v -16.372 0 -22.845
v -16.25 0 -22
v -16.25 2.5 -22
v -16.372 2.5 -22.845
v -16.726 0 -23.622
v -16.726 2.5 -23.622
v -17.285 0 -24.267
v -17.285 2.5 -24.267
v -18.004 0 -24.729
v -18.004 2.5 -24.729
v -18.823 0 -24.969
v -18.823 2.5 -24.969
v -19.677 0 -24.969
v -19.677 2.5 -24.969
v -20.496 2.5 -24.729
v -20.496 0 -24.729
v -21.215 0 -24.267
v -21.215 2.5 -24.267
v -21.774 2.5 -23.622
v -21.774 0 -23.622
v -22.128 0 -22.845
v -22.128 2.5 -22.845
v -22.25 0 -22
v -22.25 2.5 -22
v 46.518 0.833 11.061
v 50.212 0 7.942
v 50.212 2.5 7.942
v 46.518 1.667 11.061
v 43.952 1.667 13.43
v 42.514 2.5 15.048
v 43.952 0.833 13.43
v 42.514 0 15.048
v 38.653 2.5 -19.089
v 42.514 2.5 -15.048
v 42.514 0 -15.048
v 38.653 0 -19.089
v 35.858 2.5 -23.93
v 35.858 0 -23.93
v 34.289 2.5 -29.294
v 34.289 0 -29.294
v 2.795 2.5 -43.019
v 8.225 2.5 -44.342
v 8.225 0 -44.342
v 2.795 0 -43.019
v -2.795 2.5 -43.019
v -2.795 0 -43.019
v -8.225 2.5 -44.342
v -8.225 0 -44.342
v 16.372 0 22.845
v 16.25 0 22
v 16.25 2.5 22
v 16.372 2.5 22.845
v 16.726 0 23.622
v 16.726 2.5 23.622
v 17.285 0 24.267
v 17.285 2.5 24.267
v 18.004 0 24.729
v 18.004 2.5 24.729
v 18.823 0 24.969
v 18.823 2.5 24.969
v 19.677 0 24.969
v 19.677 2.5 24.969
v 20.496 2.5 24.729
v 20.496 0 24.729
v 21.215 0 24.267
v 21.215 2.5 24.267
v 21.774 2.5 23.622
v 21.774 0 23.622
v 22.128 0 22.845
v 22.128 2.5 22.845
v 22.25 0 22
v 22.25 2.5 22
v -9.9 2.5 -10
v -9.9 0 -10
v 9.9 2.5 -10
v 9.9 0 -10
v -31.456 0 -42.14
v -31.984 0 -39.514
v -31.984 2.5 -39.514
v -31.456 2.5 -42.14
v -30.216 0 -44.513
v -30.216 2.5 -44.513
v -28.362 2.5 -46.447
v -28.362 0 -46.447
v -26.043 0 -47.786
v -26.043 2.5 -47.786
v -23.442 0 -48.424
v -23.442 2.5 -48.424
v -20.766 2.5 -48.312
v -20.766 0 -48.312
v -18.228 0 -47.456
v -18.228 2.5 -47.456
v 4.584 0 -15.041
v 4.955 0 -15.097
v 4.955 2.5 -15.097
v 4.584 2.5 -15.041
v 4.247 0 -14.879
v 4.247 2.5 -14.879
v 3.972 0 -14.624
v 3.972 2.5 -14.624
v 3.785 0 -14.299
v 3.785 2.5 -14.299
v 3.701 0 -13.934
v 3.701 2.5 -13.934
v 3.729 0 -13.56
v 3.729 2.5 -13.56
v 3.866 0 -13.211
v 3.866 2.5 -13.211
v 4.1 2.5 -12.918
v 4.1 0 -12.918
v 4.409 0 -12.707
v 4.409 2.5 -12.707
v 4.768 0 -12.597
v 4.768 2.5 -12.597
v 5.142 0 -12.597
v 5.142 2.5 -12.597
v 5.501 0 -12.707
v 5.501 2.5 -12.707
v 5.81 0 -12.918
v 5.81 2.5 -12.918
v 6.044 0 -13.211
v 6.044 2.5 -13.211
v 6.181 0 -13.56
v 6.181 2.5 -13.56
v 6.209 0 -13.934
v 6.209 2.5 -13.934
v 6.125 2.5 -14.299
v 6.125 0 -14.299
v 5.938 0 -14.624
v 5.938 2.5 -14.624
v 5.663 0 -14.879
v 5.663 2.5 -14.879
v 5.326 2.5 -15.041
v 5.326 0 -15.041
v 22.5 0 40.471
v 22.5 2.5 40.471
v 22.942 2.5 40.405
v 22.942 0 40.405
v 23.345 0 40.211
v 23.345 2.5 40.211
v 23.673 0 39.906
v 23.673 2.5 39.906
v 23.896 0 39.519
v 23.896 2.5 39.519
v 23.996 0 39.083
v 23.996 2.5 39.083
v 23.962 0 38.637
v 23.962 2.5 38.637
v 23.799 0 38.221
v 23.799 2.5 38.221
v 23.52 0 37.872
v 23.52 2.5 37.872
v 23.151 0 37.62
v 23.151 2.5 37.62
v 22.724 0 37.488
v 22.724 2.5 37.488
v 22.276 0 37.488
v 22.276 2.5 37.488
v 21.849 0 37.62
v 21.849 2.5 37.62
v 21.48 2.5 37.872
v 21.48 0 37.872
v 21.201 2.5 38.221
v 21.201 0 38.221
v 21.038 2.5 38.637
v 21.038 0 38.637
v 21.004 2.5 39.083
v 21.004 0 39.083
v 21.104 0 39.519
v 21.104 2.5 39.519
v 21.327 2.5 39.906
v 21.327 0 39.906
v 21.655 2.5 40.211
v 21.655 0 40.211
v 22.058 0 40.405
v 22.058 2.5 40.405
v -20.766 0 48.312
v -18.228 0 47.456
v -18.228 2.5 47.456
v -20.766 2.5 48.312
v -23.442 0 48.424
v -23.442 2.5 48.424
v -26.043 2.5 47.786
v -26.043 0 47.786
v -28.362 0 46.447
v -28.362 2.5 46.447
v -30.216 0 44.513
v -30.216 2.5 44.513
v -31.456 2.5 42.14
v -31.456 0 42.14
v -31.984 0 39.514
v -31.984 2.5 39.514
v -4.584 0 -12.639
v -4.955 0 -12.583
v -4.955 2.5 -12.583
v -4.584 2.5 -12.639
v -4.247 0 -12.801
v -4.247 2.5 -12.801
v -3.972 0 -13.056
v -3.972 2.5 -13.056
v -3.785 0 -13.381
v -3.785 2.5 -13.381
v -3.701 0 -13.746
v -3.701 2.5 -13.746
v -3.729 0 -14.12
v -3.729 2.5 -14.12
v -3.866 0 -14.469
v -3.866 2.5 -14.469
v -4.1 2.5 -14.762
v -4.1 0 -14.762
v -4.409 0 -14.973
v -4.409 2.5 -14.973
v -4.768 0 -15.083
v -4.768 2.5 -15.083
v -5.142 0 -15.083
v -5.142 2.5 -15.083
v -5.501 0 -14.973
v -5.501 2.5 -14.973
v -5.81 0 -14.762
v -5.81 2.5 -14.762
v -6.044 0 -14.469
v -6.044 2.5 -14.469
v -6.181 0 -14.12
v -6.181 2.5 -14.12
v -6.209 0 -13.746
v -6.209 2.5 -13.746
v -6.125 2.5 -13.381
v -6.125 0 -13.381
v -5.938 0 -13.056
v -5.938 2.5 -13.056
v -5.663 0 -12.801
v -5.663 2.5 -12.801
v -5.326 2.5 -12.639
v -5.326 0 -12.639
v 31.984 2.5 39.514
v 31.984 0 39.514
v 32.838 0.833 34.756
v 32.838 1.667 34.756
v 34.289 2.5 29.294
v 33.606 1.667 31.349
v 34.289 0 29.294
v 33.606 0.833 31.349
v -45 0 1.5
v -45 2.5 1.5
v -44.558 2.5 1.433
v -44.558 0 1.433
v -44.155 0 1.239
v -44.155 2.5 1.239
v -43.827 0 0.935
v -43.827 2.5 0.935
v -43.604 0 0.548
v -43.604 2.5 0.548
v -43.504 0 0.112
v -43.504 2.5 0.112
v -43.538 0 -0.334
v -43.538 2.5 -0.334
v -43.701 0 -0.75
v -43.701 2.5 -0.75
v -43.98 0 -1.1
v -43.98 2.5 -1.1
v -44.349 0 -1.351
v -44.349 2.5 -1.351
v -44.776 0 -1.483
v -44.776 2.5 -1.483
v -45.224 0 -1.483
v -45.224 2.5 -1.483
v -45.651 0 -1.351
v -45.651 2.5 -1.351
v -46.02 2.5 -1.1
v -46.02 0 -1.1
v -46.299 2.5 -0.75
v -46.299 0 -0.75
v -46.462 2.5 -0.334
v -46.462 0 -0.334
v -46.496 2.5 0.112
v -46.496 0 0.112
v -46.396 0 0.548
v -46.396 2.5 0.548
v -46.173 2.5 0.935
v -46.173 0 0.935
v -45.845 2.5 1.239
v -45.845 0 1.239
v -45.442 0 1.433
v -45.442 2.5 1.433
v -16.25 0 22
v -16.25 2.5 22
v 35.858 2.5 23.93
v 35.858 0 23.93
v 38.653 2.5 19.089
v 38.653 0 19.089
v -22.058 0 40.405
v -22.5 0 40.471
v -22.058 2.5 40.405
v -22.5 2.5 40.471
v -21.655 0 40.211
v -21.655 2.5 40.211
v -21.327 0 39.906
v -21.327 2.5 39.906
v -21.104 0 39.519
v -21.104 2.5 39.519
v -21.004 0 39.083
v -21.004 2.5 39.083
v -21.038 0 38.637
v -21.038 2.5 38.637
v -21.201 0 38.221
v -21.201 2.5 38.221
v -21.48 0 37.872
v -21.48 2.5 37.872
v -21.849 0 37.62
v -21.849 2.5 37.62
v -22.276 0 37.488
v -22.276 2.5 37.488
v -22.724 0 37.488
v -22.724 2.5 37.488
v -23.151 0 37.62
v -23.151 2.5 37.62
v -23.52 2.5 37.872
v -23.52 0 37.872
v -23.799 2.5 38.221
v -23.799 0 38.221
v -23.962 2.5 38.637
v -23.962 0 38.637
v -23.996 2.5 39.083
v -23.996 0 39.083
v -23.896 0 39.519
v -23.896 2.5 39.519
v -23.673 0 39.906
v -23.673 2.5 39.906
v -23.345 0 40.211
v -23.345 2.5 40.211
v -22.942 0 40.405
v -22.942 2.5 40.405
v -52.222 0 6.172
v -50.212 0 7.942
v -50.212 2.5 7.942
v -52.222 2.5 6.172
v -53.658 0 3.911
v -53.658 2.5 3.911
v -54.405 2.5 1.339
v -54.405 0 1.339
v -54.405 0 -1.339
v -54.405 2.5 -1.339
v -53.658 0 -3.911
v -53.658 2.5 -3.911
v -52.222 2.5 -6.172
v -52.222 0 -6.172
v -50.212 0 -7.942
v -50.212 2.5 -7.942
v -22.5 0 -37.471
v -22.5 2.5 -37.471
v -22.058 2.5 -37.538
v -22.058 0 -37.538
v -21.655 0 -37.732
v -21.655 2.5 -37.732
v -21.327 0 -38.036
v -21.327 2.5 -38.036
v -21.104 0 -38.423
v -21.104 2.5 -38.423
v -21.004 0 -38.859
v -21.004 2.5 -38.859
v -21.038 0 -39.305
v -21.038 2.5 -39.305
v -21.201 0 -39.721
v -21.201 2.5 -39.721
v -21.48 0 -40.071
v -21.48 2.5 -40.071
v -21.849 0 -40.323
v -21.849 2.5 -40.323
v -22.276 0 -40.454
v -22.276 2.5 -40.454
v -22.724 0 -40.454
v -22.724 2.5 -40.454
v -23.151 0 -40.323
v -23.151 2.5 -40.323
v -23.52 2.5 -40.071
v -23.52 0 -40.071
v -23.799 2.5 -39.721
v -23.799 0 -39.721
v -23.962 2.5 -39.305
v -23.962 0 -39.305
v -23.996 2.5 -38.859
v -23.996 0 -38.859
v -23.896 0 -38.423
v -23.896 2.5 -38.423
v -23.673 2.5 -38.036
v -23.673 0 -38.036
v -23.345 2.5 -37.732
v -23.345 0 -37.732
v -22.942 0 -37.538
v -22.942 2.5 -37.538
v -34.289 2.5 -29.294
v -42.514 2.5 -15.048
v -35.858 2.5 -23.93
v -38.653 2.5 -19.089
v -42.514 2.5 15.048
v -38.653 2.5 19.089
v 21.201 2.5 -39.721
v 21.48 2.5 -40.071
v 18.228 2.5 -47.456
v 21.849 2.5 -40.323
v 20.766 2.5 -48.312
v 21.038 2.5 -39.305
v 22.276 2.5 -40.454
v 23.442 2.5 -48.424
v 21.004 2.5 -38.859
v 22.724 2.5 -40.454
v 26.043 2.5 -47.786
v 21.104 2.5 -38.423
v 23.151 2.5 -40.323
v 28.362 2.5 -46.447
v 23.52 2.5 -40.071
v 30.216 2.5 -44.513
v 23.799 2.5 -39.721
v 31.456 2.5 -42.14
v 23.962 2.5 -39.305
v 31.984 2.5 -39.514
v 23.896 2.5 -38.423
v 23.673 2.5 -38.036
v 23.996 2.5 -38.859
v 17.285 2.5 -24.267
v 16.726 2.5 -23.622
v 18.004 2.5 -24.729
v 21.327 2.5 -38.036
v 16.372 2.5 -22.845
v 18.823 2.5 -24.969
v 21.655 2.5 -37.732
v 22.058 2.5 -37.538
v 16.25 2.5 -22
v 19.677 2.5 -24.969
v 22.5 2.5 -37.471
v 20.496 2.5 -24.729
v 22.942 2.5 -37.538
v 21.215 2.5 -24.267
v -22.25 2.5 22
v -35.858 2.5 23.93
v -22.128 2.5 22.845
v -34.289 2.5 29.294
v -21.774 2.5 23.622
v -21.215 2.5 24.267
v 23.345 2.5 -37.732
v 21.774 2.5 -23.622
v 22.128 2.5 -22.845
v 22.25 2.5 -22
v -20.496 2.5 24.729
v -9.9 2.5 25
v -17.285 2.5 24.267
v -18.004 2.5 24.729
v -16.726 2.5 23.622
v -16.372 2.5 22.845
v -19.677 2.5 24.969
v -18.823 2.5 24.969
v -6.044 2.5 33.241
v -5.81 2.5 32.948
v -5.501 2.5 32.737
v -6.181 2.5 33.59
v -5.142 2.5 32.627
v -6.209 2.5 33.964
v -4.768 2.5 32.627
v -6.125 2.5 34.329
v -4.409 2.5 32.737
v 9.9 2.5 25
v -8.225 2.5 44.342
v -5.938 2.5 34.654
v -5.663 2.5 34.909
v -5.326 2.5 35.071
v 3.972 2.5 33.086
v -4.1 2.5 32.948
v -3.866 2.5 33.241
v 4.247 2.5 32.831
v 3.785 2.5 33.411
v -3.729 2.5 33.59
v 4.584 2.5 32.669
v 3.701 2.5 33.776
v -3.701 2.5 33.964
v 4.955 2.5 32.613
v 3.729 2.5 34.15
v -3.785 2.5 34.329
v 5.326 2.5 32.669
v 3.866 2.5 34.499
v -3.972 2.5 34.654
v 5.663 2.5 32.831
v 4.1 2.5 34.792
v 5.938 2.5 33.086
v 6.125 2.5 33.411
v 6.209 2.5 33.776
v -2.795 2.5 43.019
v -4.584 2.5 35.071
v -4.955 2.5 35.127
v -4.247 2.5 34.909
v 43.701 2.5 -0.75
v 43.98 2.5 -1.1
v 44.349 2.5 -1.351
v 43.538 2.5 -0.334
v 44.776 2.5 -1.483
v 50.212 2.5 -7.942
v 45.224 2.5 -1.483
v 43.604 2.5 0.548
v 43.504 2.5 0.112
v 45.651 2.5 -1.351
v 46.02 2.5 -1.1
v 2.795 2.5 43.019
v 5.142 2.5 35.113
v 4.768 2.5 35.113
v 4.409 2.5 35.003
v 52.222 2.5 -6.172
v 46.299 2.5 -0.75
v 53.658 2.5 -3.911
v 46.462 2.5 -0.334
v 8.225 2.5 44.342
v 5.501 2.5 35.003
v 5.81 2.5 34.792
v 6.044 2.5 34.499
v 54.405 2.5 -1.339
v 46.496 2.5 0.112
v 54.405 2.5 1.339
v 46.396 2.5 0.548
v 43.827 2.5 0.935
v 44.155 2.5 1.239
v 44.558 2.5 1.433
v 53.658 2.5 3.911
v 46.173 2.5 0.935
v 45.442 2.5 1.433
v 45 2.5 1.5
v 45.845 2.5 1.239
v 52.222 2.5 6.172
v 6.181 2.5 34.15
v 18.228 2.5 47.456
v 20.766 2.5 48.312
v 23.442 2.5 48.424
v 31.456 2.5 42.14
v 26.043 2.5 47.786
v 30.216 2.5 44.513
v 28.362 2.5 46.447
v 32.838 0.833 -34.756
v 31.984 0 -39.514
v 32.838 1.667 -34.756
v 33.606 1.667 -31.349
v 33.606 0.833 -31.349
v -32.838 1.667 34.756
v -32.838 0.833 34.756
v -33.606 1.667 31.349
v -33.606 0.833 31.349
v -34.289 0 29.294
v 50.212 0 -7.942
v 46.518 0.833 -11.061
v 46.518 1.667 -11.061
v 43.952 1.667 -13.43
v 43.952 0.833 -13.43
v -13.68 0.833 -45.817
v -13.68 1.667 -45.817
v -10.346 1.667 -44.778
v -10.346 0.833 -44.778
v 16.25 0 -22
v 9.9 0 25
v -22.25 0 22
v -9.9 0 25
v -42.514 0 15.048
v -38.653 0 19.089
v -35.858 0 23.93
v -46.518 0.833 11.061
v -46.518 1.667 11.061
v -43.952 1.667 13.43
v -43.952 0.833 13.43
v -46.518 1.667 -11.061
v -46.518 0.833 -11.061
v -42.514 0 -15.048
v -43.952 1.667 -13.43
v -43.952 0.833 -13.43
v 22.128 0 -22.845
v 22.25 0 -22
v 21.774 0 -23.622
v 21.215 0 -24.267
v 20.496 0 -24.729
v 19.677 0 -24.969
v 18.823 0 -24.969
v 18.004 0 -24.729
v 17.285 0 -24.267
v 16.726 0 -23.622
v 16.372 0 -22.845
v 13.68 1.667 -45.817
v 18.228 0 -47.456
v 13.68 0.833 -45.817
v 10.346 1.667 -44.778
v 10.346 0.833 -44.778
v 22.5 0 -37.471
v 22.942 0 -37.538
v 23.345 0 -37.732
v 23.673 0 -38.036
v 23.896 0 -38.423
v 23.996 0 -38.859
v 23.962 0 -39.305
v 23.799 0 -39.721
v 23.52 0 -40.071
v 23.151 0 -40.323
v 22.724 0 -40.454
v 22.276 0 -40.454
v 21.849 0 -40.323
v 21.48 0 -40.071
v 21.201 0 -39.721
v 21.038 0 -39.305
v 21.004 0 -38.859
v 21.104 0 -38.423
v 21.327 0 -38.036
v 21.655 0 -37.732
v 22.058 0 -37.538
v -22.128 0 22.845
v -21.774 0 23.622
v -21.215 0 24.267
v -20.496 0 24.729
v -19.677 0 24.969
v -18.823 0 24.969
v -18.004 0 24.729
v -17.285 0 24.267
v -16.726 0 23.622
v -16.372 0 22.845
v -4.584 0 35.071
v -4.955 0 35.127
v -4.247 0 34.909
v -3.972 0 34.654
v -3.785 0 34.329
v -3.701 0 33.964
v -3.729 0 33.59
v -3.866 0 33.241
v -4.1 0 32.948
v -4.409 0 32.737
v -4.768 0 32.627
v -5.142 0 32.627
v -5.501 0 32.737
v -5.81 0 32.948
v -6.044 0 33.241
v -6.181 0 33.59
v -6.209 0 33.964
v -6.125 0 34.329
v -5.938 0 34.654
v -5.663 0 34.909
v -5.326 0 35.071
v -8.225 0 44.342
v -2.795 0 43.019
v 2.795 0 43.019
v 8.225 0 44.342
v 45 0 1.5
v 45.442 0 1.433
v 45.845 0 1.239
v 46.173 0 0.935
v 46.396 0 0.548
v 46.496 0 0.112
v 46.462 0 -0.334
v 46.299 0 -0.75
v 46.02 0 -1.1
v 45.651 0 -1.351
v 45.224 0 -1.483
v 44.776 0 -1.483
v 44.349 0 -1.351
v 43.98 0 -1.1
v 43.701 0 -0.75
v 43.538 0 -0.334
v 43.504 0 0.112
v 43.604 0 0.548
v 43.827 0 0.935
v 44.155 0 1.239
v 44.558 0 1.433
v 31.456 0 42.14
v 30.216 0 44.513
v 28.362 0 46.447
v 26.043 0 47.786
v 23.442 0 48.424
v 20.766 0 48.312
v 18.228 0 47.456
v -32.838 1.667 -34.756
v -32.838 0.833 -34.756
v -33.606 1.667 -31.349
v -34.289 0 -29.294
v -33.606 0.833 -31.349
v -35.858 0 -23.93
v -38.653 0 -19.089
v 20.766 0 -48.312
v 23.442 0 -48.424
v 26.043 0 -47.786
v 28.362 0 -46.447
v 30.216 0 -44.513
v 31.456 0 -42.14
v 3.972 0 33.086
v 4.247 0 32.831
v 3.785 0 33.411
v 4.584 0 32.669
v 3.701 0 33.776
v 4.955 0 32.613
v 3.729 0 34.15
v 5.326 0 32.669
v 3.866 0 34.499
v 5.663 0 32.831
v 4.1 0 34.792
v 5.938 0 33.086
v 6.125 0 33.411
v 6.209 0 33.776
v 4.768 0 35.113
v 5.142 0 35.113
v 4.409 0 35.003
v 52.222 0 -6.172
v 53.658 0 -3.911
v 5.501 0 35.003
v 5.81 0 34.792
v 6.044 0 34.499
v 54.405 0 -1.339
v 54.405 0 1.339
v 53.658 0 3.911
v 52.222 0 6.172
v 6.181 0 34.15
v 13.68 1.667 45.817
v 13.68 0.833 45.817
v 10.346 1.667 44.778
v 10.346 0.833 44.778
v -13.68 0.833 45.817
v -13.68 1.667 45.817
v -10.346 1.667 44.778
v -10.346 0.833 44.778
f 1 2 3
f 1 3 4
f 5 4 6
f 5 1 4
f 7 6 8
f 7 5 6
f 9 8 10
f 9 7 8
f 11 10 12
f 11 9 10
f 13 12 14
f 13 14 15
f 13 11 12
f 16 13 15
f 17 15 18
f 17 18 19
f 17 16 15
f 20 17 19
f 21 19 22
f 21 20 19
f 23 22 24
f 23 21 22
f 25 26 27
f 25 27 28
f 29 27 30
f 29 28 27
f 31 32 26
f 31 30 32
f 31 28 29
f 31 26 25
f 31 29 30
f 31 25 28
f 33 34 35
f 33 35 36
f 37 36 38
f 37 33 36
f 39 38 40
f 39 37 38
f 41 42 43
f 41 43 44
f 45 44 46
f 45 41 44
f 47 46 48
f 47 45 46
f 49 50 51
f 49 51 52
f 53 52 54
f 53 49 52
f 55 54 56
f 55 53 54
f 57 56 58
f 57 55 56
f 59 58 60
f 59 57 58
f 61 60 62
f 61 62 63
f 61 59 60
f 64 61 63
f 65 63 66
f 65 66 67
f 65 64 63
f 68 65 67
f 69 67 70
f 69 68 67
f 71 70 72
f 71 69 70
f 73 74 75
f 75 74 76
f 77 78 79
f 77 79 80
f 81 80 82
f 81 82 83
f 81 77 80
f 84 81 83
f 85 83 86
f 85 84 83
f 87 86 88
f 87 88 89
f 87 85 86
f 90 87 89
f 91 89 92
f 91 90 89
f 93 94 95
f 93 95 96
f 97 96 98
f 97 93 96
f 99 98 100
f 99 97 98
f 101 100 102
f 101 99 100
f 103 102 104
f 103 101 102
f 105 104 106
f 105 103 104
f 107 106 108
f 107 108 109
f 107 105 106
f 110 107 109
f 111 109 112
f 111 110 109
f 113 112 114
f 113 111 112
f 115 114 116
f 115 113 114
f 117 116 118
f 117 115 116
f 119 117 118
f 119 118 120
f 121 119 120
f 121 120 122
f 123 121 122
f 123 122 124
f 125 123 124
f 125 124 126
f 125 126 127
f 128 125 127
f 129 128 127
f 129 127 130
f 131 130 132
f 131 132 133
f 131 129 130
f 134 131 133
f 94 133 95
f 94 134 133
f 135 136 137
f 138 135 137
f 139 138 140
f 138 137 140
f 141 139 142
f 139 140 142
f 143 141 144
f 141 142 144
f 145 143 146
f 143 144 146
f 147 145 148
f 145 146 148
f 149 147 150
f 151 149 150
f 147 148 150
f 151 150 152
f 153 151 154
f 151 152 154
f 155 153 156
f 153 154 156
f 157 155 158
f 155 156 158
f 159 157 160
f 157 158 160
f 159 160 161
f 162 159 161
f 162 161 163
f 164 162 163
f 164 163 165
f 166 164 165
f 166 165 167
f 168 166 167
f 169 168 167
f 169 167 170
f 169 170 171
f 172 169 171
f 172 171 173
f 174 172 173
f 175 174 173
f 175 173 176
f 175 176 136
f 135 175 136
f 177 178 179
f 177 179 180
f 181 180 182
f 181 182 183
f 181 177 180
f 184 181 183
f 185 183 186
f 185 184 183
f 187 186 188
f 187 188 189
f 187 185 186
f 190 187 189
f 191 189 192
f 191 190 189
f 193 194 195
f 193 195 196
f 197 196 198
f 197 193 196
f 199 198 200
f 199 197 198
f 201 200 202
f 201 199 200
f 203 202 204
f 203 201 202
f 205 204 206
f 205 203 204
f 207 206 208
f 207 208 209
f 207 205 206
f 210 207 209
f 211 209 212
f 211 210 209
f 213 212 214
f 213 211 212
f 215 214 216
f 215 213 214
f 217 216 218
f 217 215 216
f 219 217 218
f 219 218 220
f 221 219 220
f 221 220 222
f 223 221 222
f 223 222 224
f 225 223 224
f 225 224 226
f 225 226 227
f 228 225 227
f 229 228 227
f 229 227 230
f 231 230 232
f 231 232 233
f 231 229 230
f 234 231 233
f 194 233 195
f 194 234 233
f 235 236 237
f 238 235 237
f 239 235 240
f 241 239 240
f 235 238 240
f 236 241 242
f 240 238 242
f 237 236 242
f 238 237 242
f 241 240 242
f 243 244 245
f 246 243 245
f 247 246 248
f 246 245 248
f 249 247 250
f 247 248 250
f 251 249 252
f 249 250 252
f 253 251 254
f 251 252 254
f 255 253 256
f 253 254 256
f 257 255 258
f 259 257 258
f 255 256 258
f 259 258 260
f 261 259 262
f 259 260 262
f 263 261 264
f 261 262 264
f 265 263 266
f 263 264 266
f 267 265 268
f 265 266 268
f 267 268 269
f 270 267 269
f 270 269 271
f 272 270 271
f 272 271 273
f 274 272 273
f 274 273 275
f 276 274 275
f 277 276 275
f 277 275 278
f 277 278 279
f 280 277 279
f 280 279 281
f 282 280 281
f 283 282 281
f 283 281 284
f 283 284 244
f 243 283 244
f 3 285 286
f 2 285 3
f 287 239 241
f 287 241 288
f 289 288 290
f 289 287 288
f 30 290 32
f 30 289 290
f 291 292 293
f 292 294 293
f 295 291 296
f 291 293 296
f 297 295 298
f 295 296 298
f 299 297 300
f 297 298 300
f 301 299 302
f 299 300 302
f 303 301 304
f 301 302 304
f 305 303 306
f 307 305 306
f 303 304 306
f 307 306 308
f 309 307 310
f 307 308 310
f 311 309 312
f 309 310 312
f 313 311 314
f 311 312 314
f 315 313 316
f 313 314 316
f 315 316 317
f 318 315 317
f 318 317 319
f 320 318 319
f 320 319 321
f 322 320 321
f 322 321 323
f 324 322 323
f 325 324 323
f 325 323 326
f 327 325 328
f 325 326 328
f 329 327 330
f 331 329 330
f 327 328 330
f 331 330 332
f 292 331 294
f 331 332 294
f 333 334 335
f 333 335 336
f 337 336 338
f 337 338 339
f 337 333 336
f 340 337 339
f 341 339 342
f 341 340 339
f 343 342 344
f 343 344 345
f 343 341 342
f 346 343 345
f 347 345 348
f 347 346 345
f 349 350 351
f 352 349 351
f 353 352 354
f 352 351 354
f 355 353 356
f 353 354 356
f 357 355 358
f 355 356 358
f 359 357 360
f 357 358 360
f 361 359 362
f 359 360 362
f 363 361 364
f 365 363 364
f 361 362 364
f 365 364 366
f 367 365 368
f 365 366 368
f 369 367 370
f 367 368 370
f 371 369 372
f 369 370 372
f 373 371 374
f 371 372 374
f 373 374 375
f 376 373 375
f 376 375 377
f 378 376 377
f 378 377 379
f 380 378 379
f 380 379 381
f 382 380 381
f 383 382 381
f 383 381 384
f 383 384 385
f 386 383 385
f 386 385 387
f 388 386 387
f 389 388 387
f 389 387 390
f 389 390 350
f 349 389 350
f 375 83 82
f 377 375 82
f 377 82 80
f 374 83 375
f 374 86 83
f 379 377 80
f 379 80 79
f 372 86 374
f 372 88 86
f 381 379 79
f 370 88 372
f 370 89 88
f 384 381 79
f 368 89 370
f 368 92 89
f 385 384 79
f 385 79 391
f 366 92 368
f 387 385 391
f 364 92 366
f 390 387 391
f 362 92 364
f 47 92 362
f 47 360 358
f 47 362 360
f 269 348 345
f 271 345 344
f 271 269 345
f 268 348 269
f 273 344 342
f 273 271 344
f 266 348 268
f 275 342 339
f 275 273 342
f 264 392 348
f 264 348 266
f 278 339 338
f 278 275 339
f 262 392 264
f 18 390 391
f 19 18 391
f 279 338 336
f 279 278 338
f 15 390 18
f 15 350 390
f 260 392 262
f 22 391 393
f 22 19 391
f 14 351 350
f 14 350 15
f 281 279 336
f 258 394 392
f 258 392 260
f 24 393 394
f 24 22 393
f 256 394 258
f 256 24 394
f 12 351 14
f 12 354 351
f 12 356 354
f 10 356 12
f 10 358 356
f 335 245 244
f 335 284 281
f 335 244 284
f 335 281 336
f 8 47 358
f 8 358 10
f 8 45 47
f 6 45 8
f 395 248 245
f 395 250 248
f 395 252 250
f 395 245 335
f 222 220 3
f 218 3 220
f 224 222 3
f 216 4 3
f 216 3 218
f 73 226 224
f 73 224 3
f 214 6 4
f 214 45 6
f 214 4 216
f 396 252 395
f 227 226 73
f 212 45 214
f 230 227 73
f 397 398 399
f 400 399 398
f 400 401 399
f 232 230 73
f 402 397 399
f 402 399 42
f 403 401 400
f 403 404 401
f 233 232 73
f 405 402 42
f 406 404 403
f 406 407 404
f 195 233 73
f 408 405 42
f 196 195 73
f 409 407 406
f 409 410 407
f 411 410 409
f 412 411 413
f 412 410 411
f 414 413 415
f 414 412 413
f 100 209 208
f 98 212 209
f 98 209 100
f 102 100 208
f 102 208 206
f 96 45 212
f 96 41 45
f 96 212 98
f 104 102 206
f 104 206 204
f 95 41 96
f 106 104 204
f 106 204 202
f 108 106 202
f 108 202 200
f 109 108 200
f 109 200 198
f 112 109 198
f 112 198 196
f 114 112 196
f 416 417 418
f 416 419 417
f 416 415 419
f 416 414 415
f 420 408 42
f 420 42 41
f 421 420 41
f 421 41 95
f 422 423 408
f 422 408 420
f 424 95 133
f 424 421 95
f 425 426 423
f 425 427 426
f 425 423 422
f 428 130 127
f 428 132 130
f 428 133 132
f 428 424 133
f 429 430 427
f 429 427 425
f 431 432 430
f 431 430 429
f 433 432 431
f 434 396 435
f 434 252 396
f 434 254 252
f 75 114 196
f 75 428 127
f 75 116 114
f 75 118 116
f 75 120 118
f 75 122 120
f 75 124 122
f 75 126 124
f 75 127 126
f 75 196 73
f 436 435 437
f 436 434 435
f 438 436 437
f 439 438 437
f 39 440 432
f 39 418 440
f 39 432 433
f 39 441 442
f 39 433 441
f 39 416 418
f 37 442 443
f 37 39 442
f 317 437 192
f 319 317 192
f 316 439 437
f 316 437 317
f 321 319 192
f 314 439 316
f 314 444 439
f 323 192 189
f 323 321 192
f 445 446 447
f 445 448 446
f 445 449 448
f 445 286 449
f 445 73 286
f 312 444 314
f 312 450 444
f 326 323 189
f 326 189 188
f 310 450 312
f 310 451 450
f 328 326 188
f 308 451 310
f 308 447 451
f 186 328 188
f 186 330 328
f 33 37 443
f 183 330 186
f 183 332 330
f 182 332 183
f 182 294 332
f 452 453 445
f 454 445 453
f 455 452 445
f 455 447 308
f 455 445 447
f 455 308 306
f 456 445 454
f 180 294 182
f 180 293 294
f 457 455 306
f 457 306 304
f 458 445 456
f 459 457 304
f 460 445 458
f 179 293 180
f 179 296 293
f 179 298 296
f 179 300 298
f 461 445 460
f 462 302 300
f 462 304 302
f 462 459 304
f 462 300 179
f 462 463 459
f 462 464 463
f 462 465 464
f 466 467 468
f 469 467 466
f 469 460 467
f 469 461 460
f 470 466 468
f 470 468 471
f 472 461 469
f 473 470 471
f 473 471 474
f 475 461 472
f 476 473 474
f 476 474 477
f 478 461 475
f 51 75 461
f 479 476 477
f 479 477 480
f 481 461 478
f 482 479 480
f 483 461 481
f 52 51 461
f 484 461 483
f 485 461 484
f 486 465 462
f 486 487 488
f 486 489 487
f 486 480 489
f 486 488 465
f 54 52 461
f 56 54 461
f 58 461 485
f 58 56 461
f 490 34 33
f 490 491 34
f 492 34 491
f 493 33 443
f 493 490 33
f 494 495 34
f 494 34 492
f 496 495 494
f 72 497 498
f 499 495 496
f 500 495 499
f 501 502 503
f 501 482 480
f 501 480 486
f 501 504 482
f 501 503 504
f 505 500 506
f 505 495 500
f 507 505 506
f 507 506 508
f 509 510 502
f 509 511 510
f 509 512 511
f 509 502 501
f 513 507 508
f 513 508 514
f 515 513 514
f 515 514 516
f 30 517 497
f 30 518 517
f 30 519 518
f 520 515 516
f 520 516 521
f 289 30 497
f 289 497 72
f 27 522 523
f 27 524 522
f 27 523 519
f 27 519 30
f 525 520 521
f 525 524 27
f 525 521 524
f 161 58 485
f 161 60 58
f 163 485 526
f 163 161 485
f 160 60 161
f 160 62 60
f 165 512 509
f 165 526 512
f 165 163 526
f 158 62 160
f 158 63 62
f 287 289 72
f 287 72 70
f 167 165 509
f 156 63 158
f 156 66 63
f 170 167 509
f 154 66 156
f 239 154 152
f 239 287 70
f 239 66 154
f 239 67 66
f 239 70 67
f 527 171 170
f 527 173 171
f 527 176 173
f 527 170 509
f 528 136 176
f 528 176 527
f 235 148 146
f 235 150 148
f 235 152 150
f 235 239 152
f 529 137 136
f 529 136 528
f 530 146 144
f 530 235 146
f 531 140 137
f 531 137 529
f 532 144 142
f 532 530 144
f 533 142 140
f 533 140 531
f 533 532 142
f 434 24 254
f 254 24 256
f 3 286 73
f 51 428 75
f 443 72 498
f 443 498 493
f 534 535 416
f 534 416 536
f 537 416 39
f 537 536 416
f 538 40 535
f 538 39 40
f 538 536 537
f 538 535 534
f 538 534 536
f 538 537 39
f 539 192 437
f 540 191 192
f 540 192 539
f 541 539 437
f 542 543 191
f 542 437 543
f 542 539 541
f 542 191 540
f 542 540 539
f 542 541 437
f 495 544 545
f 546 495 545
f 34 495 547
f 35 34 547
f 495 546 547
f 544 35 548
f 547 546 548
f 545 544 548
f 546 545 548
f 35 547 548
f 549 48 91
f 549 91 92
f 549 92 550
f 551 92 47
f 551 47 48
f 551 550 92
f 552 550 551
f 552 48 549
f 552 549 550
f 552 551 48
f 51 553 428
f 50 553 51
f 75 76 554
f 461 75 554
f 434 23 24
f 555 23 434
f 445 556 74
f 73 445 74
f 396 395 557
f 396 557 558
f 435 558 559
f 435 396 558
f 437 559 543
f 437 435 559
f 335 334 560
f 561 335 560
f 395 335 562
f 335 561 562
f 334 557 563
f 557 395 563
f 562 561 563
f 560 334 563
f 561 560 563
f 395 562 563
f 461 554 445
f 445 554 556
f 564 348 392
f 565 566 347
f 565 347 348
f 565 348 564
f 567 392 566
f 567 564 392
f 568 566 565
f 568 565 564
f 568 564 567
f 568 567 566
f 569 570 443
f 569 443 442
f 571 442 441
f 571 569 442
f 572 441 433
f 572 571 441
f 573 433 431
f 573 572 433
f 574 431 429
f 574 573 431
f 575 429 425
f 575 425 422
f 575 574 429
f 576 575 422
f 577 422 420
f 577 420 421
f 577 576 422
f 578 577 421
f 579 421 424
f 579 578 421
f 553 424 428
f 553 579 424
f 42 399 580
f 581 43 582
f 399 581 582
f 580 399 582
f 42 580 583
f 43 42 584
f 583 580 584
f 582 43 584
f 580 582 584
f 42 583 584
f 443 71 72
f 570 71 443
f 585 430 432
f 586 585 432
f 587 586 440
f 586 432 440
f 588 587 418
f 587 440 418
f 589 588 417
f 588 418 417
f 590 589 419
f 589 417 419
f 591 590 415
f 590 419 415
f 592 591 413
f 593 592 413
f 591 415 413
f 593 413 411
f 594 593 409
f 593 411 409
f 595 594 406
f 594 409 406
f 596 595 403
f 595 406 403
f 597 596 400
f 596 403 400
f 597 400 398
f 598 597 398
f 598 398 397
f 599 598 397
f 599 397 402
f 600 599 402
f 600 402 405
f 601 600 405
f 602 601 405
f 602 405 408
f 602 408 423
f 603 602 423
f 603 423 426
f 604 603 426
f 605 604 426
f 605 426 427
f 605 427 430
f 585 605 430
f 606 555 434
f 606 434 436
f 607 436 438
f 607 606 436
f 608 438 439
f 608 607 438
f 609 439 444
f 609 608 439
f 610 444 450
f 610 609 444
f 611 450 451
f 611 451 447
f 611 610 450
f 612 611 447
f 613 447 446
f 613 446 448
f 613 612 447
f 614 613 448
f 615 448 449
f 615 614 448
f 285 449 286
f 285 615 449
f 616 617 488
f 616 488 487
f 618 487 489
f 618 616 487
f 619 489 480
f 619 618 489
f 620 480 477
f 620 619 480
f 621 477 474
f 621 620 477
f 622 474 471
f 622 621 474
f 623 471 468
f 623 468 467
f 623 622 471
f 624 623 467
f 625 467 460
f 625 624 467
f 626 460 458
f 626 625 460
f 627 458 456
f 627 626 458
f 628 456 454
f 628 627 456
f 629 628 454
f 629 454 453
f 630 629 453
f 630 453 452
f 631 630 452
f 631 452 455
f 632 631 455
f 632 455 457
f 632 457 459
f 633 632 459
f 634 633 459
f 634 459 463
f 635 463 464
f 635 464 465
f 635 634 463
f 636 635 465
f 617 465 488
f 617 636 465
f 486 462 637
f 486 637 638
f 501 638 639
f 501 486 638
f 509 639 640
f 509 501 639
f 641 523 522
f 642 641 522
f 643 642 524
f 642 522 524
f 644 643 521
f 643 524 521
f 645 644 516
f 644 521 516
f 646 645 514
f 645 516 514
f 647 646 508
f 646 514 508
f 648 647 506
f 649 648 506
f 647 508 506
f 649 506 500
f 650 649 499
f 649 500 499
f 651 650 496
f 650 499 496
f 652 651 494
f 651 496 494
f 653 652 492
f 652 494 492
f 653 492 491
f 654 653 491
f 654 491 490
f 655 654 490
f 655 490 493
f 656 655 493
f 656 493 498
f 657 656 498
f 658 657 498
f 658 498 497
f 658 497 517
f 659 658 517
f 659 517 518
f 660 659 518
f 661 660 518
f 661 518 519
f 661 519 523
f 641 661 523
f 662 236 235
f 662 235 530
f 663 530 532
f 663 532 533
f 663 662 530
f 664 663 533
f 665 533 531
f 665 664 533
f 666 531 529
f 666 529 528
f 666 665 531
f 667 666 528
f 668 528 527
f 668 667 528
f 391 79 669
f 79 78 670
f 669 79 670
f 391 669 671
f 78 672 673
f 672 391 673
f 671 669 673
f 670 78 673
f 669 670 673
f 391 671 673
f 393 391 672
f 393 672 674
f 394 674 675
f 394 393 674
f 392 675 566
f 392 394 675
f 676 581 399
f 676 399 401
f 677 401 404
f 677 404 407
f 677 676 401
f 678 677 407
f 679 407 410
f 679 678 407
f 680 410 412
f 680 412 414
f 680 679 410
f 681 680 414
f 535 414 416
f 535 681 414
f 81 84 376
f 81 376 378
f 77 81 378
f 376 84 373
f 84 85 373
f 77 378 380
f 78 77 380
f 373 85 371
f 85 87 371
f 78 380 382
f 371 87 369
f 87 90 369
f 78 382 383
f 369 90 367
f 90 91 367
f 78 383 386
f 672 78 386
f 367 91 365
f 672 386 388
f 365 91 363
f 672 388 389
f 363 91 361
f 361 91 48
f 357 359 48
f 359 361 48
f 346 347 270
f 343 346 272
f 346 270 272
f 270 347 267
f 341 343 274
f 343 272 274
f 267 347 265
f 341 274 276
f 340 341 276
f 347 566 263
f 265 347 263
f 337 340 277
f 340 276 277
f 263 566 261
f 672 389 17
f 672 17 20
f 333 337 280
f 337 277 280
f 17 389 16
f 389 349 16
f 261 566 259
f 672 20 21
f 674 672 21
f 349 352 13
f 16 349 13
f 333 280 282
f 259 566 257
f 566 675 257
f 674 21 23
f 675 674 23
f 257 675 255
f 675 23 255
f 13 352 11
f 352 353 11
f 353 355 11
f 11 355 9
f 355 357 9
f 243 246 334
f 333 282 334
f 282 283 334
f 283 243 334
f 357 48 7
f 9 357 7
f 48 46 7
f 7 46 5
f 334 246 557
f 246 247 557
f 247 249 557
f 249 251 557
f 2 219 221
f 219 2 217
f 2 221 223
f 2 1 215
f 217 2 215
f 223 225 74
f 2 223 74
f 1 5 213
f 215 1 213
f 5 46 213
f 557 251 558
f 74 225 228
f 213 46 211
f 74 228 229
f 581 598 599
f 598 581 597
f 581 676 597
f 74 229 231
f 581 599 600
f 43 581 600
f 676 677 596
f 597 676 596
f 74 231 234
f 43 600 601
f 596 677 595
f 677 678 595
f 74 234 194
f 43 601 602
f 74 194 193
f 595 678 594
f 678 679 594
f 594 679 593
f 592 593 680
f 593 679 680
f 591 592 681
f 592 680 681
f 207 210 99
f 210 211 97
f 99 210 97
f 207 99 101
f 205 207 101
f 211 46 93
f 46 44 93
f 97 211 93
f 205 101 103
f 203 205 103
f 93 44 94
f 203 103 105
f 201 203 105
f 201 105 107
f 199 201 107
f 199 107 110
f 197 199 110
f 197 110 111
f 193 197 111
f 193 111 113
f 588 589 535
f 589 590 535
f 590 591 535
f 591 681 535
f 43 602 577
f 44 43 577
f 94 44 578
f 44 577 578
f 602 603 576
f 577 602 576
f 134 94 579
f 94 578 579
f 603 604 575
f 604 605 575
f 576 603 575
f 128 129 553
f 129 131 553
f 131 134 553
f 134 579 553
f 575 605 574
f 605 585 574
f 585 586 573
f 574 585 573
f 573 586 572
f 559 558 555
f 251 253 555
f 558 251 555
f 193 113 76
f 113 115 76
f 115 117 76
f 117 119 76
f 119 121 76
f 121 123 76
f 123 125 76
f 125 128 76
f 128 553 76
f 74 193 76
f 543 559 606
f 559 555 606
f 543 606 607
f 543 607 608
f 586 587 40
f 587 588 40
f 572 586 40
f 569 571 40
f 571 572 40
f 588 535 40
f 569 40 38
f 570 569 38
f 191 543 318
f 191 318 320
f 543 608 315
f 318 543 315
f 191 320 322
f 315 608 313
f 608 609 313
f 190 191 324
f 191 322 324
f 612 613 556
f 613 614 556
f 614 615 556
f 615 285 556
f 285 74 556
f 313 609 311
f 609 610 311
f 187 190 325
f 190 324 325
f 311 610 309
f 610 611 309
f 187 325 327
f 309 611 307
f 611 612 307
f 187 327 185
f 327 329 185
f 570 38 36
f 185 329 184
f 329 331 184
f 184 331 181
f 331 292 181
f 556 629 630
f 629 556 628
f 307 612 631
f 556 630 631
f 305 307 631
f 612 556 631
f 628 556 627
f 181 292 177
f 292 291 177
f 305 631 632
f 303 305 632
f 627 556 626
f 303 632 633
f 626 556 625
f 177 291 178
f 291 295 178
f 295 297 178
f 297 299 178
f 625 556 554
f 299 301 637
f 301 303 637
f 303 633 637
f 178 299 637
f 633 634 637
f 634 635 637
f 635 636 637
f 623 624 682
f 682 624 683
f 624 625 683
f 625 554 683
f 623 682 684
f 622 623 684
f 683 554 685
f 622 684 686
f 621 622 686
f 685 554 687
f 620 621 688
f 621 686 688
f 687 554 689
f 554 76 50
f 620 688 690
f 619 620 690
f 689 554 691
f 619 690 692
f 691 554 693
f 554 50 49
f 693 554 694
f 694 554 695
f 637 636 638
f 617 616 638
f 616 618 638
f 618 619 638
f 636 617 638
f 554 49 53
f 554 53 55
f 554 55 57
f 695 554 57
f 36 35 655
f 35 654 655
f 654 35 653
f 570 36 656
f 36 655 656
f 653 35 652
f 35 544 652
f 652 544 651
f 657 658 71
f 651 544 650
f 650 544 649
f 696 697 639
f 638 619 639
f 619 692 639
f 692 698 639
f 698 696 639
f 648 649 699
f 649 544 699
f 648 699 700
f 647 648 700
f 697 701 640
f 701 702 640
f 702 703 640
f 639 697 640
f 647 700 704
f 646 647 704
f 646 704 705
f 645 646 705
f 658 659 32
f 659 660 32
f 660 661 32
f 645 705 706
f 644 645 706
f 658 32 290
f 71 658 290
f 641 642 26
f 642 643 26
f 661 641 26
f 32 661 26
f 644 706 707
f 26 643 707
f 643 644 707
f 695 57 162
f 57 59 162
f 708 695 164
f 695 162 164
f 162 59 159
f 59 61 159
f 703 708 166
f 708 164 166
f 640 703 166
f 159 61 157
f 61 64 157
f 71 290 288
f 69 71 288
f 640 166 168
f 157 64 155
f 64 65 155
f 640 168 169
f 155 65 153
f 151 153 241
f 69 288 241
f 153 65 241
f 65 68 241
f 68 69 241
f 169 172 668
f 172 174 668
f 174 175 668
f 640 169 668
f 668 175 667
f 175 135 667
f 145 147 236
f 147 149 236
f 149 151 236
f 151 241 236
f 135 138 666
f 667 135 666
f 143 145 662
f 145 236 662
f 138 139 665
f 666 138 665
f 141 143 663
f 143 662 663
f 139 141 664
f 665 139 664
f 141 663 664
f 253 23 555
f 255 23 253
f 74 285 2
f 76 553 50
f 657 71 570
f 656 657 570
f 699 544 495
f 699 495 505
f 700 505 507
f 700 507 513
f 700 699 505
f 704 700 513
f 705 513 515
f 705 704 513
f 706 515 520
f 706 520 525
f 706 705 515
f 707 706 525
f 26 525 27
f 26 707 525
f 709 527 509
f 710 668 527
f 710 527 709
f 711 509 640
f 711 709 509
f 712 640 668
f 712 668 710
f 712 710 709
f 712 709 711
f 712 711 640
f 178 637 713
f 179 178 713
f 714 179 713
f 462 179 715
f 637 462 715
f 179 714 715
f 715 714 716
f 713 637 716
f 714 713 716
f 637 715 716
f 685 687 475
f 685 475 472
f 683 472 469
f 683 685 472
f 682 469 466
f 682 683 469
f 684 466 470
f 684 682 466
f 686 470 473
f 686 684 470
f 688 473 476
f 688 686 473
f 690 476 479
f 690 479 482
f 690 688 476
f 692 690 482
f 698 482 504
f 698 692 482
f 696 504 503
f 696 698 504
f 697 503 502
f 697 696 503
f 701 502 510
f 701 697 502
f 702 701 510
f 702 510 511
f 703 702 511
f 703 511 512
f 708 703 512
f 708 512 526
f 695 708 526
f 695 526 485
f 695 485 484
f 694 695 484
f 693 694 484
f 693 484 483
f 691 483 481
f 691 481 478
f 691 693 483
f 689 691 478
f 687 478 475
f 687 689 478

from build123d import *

# Parameters (mm, degrees)
SKETCH1_R           = 45
SKETCH1_R_2         = 1.2573
BOSS_EXTRUDE2_DEPTH = 2.5
BOSS_EXTRUDE4_START = -2.5
BOSS_EXTRUDE4_DEPTH = 2.5
CIRPATTERN1_COUNT   = 6
CUT_EXTRUDE2_DEPTH  = 2.5
SKETCH6_R           = 1.5
CUT_EXTRUDE3_DEPTH  = 5


with BuildPart() as part:
    # Sketch1 → Boss-Extrude2 (new body)
    with BuildSketch(Plane(origin=(0, 0, 0), x_dir=(1, 0, 0), z_dir=(0, 1, 0))):
        with Locations(Location((0, 0, 0), (0, 0, 270))):
            Circle(SKETCH1_R)
        with Locations(Location((-4.955, -33.87, 0), (0, 0, 270))):
            Circle(SKETCH1_R_2, mode=Mode.SUBTRACT)
        with Locations(Location((4.955, -33.87, 0), (0, 0, 90))):
            Circle(SKETCH1_R_2, mode=Mode.SUBTRACT)
        with Locations(Location((-4.955, 13.84, 0), (0, 0, 270))):
            Circle(SKETCH1_R_2, mode=Mode.SUBTRACT)
        with Locations(Location((4.955, 13.84, 0), (0, 0, 90))):
            Circle(SKETCH1_R_2, mode=Mode.SUBTRACT)
        Polygon((-9.9, -25), (-9.9, 0), (-9.9, 10), (9.9, 10), (9.9, 0), (9.9, -25), align=None, mode=Mode.SUBTRACT)
        with BuildLine():
            Line((-22.25, 22), (-22.25, -22))
            ThreePointArc((-22.25, -22), (-19.25, -25), (-16.25, -22))
            Line((-16.25, -22), (-16.25, 22))
            ThreePointArc((-16.25, 22), (-19.25, 25), (-22.25, 22))
        make_face(mode=Mode.SUBTRACT)
        with BuildLine():
            Line((16.25, 22), (16.25, -22))
            ThreePointArc((16.25, -22), (19.25, -25), (22.25, -22))
            Line((22.25, -22), (22.25, 22))
            ThreePointArc((22.25, 22), (19.25, 25), (16.25, 22))
        make_face(mode=Mode.SUBTRACT)
    extrude(amount=BOSS_EXTRUDE2_DEPTH)

    # Sketch2 → Boss-Extrude4 (add)
    with BuildSketch(Plane(origin=(0, 2.5, 0), x_dir=(1, 0, 0), z_dir=(0, 1, 0)).offset(BOSS_EXTRUDE4_START)):
        with BuildLine():
            ThreePointArc((-42.23454554, 15.532004475), (-45, 0), (-42.23454554, -15.532004475))
            add(Edge.make_bspline(
                [(-50.212380227, -7.942360629), (-45.3159648, -11.95963121), (-42.656686571, -14.489512492), (-42.23454554, -15.532004475)],
                knots=[0.089311832, 0.089311832, 0.089311832, 0.089311832, 1, 1, 1, 1], degree=3))
            ThreePointArc((-50.212380227, -7.942360629), (-54.5, 0), (-50.212380227, 7.942360629))
            add(Edge.make_bspline(
                [(-50.212380227, 7.942360629), (-45.3159648, 11.95963121), (-42.656686571, 14.489512492), (-42.23454554, 15.532004475)],
                knots=[0.089311832, 0.089311832, 0.089311832, 0.089311832, 1, 1, 1, 1], degree=3))
        make_face()
    boss_extrude4 = extrude(amount=BOSS_EXTRUDE4_DEPTH)

    # CirPattern1: Boss-Extrude4 ×6 about axis
    cirpattern1_axis = Axis((0, 2.5, 0), (0, 1, 0))
    for i in range(1, CIRPATTERN1_COUNT):
        add(boss_extrude4.rotate(cirpattern1_axis, i * 360 / CIRPATTERN1_COUNT))

    # Sketch5 → Cut-Extrude2 (cut)
    with BuildSketch(Plane(origin=(0, 2.5, 0), x_dir=(1, 0, 0), z_dir=(0, 1, 0))):
        with BuildLine():
            Line((-8.22468756, 44.342191593), (0, 46.65782144))
            Line((0, 46.65782144), (8.22468756, 44.342191593))
            ThreePointArc((8.22468756, 44.342191593), (0, 42.851652617), (-8.22468756, 44.342191593))
        make_face()
        with BuildLine():
            Line((40.406858652, 23.32891072), (42.513808159, 15.048307431))
            ThreePointArc((42.513808159, 15.048307431), (37.11061976, 21.425826308), (34.289120599, 29.293884161))
            Line((34.289120599, 29.293884161), (40.406858652, 23.32891072))
        make_face()
        with BuildLine():
            Line((40.406858652, -23.32891072), (34.289120599, -29.293884161))
            ThreePointArc((34.289120599, -29.293884161), (37.11061976, -21.425826308), (42.513808159, -15.048307431))
            Line((42.513808159, -15.048307431), (40.406858652, -23.32891072))
        make_face()
        with BuildLine():
            Line((0, -46.65782144), (-8.22468756, -44.342191593))
            ThreePointArc((-8.22468756, -44.342191593), (0, -42.851652617), (8.22468756, -44.342191593))
            Line((8.22468756, -44.342191593), (0, -46.65782144))
        make_face()
        with BuildLine():
            Line((-40.406858652, -23.32891072), (-42.513808159, -15.048307431))
            ThreePointArc((-42.513808159, -15.048307431), (-37.11061976, -21.425826308), (-34.289120599, -29.293884161))
            Line((-34.289120599, -29.293884161), (-40.406858652, -23.32891072))
        make_face()
        with BuildLine():
            Line((-40.406858652, 23.32891072), (-34.289120599, 29.293884161))
            ThreePointArc((-34.289120599, 29.293884161), (-37.11061976, 21.425826308), (-42.513808159, 15.048307431))
            Line((-42.513808159, 15.048307431), (-40.406858652, 23.32891072))
        make_face()
    extrude(amount=-CUT_EXTRUDE2_DEPTH, mode=Mode.SUBTRACT)

    # Sketch6 → Cut-Extrude3 (cut, symmetric)
    with BuildSketch(Plane(origin=(0, 2.5, 0), x_dir=(1, 0, 0), z_dir=(0, 1, 0))):
        with Locations(Location((-45, 0, 0), (0, 0, 270))):
            Circle(SKETCH6_R)
        with Locations(Location((-22.5, 38.97114317, 0), (0, 0, 270))):
            Circle(SKETCH6_R)
        with Locations(Location((22.5, 38.97114317, 0), (0, 0, 270))):
            Circle(SKETCH6_R)
        with Locations(Location((45, 0, 0), (0, 0, 270))):
            Circle(SKETCH6_R)
        with Locations(Location((22.5, -38.97114317, 0), (0, 0, 270))):
            Circle(SKETCH6_R)
        with Locations(Location((-22.5, -38.97114317, 0), (0, 0, 270))):
            Circle(SKETCH6_R)
    extrude(amount=CUT_EXTRUDE3_DEPTH, both=True, mode=Mode.SUBTRACT)


solid = part.part
